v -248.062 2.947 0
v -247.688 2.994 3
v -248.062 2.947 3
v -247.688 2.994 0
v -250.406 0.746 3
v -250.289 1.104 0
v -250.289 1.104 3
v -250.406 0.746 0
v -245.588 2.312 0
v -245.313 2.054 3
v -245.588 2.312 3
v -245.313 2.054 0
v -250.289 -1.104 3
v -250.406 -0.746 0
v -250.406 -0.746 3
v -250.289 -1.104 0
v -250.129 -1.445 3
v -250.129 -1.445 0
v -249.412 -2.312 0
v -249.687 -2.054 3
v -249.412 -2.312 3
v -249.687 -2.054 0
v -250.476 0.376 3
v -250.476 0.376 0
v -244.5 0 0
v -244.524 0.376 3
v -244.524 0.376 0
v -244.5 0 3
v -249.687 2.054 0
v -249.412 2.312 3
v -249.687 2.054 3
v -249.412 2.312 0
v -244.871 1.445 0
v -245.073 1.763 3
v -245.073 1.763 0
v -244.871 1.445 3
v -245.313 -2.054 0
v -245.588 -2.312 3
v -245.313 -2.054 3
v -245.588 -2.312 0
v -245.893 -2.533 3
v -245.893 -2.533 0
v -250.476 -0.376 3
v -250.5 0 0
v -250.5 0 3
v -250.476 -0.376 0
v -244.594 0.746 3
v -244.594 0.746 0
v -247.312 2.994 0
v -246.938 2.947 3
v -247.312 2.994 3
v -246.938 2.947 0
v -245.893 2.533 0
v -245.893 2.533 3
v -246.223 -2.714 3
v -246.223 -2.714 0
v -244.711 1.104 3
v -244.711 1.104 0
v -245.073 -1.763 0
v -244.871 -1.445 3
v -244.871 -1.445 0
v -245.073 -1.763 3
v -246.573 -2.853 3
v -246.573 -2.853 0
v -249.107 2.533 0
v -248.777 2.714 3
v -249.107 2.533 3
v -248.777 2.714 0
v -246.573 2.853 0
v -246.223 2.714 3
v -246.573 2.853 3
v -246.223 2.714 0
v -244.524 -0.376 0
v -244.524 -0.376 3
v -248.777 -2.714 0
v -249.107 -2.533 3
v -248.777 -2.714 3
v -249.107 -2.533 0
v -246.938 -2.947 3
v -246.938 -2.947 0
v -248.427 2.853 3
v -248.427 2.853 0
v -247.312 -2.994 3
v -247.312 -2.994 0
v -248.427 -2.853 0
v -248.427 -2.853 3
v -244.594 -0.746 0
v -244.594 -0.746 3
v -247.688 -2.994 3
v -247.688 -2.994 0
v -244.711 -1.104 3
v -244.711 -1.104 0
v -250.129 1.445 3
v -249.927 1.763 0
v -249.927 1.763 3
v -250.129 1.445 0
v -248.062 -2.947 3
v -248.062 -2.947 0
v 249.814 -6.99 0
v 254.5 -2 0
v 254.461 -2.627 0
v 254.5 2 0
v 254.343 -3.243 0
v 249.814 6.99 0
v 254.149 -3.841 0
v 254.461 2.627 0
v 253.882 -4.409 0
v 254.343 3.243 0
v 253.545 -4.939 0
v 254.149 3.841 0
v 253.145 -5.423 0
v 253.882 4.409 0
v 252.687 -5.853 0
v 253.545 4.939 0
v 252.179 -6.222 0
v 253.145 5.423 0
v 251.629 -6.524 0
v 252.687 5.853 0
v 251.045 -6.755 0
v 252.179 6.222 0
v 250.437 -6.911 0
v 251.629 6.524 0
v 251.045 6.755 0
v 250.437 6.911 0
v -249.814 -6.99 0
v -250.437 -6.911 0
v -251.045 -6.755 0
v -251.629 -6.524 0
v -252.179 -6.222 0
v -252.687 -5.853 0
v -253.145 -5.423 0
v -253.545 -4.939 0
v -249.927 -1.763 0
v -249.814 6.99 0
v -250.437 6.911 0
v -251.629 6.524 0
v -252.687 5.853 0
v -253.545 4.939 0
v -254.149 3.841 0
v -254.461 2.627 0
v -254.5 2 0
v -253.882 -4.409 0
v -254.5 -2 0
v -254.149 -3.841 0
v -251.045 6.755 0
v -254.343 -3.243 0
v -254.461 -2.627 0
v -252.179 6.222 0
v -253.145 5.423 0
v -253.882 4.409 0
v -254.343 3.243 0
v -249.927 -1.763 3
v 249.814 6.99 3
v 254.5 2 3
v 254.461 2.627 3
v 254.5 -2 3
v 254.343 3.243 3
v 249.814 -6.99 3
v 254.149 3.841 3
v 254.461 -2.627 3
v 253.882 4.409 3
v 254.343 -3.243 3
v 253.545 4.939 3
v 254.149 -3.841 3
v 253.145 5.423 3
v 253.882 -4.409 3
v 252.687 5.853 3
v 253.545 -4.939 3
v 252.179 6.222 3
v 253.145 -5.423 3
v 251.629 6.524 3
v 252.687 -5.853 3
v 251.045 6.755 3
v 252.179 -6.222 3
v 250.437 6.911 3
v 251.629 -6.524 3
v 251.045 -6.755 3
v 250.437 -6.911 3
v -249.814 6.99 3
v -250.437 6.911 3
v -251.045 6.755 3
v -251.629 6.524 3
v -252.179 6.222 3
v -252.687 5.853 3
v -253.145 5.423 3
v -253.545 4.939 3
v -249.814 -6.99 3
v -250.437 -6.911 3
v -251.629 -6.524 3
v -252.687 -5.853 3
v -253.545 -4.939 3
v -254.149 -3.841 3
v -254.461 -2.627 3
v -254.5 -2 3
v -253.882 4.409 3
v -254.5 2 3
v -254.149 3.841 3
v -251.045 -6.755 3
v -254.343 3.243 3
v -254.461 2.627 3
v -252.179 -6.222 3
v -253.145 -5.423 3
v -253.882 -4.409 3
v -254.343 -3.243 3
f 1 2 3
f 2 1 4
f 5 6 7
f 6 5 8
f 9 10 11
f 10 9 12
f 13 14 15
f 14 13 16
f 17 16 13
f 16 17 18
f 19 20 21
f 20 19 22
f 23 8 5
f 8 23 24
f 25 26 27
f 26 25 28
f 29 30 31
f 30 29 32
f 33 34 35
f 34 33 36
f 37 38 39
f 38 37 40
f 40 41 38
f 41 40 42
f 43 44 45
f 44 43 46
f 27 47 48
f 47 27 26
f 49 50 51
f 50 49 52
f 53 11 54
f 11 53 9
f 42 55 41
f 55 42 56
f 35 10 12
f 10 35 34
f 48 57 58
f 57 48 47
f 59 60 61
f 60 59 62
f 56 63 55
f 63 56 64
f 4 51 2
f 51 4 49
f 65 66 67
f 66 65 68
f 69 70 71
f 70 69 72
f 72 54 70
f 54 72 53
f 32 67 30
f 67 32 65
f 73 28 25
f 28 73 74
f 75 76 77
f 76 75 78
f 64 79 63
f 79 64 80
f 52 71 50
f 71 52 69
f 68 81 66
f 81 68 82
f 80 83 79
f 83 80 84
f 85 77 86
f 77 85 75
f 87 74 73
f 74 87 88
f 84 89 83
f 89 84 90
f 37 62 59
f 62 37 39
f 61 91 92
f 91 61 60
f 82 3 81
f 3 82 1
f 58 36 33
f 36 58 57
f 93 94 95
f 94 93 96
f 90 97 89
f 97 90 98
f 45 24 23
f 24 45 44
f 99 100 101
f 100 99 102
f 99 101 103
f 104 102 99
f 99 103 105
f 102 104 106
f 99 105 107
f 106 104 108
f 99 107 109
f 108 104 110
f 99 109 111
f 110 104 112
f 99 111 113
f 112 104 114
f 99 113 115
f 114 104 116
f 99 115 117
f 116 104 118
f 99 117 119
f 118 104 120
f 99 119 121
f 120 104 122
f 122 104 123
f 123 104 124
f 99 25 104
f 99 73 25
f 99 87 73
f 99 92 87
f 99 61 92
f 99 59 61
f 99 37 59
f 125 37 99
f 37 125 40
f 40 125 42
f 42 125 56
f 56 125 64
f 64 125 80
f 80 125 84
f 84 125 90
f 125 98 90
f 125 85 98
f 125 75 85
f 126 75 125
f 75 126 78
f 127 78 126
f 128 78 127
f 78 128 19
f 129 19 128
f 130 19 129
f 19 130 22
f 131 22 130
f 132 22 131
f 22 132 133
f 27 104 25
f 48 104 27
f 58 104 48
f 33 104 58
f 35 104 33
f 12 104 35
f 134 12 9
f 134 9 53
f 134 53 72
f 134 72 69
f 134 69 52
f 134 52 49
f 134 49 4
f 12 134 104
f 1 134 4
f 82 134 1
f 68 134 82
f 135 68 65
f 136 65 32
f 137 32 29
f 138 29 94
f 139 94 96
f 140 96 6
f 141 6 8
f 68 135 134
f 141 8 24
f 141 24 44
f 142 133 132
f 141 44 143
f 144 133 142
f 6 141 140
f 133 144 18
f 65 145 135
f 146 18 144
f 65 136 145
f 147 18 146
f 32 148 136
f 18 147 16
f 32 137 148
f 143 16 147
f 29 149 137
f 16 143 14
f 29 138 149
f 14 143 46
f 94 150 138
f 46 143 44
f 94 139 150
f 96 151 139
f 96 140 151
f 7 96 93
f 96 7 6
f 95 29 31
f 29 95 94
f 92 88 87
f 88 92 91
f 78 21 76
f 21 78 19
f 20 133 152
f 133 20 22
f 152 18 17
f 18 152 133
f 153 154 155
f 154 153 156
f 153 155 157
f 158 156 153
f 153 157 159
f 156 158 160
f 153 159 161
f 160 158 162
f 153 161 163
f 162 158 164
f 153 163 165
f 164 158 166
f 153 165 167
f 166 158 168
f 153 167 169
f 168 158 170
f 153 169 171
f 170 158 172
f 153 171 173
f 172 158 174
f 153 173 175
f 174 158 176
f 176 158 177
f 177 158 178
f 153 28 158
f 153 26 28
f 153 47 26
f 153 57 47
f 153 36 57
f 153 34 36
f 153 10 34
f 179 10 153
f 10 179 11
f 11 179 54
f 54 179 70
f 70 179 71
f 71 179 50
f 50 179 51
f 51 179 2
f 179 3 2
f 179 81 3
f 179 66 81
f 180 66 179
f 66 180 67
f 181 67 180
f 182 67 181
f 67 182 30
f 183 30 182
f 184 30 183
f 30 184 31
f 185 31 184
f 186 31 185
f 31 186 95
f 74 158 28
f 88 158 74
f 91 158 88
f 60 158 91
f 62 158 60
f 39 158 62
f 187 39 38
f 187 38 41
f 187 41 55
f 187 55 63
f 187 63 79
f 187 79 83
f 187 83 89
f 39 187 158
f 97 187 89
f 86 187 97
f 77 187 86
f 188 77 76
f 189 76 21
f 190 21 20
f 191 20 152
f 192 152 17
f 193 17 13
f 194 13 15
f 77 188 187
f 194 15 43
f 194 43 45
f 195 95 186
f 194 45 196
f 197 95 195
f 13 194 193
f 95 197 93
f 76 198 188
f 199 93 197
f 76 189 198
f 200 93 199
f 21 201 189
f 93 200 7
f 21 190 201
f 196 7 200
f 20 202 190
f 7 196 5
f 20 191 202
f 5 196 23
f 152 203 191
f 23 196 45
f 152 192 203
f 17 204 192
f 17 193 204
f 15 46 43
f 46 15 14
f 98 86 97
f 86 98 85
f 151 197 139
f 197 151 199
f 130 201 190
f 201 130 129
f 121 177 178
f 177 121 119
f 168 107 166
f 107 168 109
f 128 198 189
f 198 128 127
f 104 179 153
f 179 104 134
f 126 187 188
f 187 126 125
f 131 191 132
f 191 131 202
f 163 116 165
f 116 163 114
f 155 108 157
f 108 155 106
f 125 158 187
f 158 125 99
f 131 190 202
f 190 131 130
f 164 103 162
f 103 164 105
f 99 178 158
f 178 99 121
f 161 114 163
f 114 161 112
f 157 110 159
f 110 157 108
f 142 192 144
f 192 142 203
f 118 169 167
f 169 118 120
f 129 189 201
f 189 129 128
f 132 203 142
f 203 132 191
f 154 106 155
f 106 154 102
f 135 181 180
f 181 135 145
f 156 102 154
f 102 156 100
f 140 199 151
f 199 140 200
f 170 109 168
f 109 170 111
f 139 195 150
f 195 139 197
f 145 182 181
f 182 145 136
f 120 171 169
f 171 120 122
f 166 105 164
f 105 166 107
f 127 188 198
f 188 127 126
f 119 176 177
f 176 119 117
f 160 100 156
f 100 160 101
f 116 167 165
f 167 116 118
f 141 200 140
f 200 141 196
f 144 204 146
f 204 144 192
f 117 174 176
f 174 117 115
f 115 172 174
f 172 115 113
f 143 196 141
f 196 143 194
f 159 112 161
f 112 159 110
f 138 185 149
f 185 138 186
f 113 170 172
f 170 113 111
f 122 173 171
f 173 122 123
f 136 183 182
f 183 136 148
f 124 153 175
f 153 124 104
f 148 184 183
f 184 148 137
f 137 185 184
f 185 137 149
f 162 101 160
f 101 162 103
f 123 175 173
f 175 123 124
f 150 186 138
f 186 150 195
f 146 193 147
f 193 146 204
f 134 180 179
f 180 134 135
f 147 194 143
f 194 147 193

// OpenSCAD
$fn = 50;


difference() {
	union() {
		hull() {
			translate(v = [-249.5000000000, 2.0000000000, 0]) {
				cylinder(h = 3, r = 5);
			}
			translate(v = [249.5000000000, 2.0000000000, 0]) {
				cylinder(h = 3, r = 5);
			}
			translate(v = [-249.5000000000, -2.0000000000, 0]) {
				cylinder(h = 3, r = 5);
			}
			translate(v = [249.5000000000, -2.0000000000, 0]) {
				cylinder(h = 3, r = 5);
			}
		}
	}
	union() {
		translate(v = [-247.5000000000, 0.0000000000, 0]) {
			cylinder(h = 3, r = 3.0000000000);
		}
		translate(v = [-247.5000000000, 0.0000000000, 0]) {
			cylinder(h = 3, r = 1.5000000000);
		}
		translate(v = [-247.5000000000, 0.0000000000, 0]) {
			cylinder(h = 3, r = 1.5000000000);
		}
		translate(v = [-247.5000000000, 0.0000000000, 0]) {
			cylinder(h = 3, r = 1.5000000000);
		}
	}
}
